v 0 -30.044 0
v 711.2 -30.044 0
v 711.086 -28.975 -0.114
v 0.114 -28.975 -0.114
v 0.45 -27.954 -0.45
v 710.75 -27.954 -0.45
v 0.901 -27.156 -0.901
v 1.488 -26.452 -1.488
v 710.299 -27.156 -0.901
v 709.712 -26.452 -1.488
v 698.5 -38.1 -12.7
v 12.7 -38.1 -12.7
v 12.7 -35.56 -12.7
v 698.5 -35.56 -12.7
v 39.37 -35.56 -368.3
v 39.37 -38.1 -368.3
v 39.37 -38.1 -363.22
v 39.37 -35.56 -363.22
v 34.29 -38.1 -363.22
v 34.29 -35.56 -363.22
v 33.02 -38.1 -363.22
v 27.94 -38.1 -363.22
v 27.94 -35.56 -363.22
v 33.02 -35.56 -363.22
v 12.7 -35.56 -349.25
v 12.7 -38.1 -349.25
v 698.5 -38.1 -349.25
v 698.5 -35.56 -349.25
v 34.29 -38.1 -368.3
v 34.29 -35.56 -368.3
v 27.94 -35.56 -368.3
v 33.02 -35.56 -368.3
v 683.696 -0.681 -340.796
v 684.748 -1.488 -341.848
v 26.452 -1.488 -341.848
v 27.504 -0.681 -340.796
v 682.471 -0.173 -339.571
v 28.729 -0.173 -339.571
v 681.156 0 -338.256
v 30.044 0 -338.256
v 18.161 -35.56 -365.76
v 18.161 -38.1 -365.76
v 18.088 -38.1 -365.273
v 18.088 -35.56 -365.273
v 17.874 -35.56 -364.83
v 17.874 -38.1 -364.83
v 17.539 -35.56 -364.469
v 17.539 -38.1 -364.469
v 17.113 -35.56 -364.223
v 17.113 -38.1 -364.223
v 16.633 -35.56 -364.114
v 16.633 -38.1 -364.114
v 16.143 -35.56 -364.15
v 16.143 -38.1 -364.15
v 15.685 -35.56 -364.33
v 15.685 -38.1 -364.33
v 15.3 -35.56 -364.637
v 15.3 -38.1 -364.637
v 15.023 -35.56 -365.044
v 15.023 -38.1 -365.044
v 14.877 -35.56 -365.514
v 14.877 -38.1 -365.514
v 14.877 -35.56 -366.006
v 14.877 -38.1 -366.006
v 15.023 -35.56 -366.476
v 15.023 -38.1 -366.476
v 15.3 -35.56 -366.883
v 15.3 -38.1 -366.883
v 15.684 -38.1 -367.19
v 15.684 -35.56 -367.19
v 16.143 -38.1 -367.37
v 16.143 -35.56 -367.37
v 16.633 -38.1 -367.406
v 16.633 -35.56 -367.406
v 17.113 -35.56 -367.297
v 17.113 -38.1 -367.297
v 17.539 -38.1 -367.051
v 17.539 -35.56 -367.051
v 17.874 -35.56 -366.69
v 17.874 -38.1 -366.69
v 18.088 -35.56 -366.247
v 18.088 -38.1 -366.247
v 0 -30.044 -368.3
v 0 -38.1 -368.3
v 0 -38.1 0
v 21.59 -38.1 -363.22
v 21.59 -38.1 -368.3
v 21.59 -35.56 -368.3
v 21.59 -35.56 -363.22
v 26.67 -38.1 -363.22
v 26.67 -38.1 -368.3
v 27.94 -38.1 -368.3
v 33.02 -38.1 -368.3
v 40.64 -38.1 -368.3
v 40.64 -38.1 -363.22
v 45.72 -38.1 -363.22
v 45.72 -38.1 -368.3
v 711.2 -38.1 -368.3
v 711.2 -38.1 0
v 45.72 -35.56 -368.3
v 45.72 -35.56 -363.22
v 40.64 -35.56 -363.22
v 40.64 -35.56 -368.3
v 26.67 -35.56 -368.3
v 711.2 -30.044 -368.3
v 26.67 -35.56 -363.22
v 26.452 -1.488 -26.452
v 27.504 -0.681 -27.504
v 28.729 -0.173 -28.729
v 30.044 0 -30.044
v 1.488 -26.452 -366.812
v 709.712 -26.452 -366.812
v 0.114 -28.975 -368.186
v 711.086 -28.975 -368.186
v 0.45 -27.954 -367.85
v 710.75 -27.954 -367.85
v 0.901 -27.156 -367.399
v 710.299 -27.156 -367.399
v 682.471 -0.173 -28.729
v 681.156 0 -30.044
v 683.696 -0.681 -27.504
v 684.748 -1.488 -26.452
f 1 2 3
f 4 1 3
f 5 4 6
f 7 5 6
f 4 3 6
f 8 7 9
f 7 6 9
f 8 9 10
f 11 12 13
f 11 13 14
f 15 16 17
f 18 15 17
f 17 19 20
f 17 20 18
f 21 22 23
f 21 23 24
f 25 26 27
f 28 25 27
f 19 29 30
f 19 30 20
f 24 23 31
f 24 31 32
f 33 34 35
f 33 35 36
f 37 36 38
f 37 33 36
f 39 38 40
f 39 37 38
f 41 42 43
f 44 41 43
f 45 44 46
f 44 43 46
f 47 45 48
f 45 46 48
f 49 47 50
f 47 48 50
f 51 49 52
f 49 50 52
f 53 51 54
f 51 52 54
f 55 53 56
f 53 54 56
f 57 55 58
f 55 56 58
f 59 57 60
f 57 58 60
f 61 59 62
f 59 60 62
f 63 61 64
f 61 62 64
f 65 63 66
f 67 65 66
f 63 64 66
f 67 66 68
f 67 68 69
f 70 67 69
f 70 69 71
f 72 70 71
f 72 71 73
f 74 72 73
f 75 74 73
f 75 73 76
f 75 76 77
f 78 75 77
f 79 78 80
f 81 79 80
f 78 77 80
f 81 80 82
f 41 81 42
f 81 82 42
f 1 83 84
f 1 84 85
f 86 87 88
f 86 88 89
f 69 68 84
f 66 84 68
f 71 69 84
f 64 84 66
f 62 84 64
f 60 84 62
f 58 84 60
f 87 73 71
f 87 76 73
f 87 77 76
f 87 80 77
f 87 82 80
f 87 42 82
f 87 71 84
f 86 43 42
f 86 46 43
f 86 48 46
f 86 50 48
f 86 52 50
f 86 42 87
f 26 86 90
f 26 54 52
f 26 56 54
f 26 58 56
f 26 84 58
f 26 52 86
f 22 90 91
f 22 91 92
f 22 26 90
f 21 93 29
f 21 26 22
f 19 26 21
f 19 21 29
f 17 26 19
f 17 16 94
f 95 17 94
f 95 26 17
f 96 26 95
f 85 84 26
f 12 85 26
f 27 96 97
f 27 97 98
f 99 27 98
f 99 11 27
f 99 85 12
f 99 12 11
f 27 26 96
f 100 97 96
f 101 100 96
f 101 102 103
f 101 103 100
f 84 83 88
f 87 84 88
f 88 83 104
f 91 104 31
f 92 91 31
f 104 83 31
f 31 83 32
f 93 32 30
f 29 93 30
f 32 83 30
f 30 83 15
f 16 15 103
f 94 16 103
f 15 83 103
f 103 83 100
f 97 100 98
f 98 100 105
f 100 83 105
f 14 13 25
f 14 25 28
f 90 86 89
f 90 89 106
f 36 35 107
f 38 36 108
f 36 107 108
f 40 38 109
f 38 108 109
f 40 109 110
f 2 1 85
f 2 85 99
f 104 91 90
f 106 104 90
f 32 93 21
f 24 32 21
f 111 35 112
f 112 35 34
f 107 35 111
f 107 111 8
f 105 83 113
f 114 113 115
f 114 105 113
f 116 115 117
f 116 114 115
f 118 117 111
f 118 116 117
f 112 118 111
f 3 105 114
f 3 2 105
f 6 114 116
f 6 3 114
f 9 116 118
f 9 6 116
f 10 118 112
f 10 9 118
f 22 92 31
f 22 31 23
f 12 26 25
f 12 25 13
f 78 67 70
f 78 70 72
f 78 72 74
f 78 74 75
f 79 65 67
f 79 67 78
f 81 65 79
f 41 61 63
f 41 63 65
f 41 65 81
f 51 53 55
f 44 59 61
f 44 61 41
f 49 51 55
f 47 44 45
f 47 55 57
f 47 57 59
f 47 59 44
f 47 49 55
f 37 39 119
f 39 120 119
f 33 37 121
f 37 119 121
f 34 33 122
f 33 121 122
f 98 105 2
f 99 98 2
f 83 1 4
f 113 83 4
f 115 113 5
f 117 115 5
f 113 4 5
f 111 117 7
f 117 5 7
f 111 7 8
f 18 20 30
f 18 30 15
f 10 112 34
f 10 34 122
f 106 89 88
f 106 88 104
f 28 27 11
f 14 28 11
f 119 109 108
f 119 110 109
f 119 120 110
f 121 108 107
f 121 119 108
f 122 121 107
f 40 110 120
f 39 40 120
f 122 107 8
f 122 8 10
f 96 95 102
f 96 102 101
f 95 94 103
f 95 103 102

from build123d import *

# Parameters (mm, degrees)
F0_W     = 711.2
F0_H     = 368.3
F1_DEPTH = 38.1
F2_W     = 685.8
F2_H     = 336.55
F3_DEPTH = 2.54
F4_W     = 5.08
F4_H     = 5.08
F4_R     = 1.651
F5_DEPTH = 2.54
F6_DEPTH = 2.54
F7_SIZE  = 27.94
F8_R     = 5.08


with BuildPart() as f1:
    # F0 (on Front) → F1 (new body)
    with BuildSketch(Plane.XZ):
        with Locations((355.6, -184.15)):
            Rectangle(F0_W, F0_H)
    extrude(amount=F1_DEPTH)

    # F2 (on face) → F3 (cut)
    with BuildSketch(Plane.XZ.offset(38.1)):
        with Locations((355.6, -180.975)):
            Rectangle(F2_W, F2_H)
    extrude(amount=-F3_DEPTH, mode=Mode.SUBTRACT)

    # F4 (on face) → F5 (cut)
    with BuildSketch(Plane.XZ.offset(38.1)):
        with Locations((24.13, -365.76)):
            Rectangle(F4_W, F4_H)
        with Locations((43.18, -365.76)):
            Rectangle(F4_W, F4_H)
        with Locations((36.83, -365.76)):
            Rectangle(F4_W, F4_H)
        with Locations((30.48, -365.76)):
            Rectangle(F4_W, F4_H)
        with Locations((16.51, -365.76)):
            Circle(F4_R)
    extrude(amount=-F5_DEPTH, mode=Mode.SUBTRACT)

    # F4 (on face) → F6 (cut)
    with BuildSketch(Plane.XZ.offset(38.1)):
        with Locations((24.13, -365.76)):
            Rectangle(F4_W, F4_H)
        with Locations((43.18, -365.76)):
            Rectangle(F4_W, F4_H)
        with Locations((36.83, -365.76)):
            Rectangle(F4_W, F4_H)
        with Locations((30.48, -365.76)):
            Rectangle(F4_W, F4_H)
        with Locations((16.51, -365.76)):
            Circle(F4_R)
    extrude(amount=-F6_DEPTH, mode=Mode.SUBTRACT)

    # F7
    f7_edges = [f1.edges().sort_by_distance(p)[0] for p in [
        (355.6, 0, -368.3),
        (0, 0, -184.15),
        (711.2, 0, -184.15),
        (355.6, 0, 0),
    ]]
    chamfer(f7_edges, length=F7_SIZE)

    # F8
    f8_edges = [f1.edges().sort_by_distance(p)[0] for p in [
        (683.26, 0, -184.15),
        (355.6, 0, -340.36),
        (27.94, 0, -184.15),
        (355.6, 0, -27.94),
        (711.2, -27.94, -184.15),
        (355.6, -27.94, 0),
        (355.6, -27.94, -368.3),
        (0, -27.94, -184.15),
    ]]
    fillet(f8_edges, radius=F8_R)


solid = f1.part
